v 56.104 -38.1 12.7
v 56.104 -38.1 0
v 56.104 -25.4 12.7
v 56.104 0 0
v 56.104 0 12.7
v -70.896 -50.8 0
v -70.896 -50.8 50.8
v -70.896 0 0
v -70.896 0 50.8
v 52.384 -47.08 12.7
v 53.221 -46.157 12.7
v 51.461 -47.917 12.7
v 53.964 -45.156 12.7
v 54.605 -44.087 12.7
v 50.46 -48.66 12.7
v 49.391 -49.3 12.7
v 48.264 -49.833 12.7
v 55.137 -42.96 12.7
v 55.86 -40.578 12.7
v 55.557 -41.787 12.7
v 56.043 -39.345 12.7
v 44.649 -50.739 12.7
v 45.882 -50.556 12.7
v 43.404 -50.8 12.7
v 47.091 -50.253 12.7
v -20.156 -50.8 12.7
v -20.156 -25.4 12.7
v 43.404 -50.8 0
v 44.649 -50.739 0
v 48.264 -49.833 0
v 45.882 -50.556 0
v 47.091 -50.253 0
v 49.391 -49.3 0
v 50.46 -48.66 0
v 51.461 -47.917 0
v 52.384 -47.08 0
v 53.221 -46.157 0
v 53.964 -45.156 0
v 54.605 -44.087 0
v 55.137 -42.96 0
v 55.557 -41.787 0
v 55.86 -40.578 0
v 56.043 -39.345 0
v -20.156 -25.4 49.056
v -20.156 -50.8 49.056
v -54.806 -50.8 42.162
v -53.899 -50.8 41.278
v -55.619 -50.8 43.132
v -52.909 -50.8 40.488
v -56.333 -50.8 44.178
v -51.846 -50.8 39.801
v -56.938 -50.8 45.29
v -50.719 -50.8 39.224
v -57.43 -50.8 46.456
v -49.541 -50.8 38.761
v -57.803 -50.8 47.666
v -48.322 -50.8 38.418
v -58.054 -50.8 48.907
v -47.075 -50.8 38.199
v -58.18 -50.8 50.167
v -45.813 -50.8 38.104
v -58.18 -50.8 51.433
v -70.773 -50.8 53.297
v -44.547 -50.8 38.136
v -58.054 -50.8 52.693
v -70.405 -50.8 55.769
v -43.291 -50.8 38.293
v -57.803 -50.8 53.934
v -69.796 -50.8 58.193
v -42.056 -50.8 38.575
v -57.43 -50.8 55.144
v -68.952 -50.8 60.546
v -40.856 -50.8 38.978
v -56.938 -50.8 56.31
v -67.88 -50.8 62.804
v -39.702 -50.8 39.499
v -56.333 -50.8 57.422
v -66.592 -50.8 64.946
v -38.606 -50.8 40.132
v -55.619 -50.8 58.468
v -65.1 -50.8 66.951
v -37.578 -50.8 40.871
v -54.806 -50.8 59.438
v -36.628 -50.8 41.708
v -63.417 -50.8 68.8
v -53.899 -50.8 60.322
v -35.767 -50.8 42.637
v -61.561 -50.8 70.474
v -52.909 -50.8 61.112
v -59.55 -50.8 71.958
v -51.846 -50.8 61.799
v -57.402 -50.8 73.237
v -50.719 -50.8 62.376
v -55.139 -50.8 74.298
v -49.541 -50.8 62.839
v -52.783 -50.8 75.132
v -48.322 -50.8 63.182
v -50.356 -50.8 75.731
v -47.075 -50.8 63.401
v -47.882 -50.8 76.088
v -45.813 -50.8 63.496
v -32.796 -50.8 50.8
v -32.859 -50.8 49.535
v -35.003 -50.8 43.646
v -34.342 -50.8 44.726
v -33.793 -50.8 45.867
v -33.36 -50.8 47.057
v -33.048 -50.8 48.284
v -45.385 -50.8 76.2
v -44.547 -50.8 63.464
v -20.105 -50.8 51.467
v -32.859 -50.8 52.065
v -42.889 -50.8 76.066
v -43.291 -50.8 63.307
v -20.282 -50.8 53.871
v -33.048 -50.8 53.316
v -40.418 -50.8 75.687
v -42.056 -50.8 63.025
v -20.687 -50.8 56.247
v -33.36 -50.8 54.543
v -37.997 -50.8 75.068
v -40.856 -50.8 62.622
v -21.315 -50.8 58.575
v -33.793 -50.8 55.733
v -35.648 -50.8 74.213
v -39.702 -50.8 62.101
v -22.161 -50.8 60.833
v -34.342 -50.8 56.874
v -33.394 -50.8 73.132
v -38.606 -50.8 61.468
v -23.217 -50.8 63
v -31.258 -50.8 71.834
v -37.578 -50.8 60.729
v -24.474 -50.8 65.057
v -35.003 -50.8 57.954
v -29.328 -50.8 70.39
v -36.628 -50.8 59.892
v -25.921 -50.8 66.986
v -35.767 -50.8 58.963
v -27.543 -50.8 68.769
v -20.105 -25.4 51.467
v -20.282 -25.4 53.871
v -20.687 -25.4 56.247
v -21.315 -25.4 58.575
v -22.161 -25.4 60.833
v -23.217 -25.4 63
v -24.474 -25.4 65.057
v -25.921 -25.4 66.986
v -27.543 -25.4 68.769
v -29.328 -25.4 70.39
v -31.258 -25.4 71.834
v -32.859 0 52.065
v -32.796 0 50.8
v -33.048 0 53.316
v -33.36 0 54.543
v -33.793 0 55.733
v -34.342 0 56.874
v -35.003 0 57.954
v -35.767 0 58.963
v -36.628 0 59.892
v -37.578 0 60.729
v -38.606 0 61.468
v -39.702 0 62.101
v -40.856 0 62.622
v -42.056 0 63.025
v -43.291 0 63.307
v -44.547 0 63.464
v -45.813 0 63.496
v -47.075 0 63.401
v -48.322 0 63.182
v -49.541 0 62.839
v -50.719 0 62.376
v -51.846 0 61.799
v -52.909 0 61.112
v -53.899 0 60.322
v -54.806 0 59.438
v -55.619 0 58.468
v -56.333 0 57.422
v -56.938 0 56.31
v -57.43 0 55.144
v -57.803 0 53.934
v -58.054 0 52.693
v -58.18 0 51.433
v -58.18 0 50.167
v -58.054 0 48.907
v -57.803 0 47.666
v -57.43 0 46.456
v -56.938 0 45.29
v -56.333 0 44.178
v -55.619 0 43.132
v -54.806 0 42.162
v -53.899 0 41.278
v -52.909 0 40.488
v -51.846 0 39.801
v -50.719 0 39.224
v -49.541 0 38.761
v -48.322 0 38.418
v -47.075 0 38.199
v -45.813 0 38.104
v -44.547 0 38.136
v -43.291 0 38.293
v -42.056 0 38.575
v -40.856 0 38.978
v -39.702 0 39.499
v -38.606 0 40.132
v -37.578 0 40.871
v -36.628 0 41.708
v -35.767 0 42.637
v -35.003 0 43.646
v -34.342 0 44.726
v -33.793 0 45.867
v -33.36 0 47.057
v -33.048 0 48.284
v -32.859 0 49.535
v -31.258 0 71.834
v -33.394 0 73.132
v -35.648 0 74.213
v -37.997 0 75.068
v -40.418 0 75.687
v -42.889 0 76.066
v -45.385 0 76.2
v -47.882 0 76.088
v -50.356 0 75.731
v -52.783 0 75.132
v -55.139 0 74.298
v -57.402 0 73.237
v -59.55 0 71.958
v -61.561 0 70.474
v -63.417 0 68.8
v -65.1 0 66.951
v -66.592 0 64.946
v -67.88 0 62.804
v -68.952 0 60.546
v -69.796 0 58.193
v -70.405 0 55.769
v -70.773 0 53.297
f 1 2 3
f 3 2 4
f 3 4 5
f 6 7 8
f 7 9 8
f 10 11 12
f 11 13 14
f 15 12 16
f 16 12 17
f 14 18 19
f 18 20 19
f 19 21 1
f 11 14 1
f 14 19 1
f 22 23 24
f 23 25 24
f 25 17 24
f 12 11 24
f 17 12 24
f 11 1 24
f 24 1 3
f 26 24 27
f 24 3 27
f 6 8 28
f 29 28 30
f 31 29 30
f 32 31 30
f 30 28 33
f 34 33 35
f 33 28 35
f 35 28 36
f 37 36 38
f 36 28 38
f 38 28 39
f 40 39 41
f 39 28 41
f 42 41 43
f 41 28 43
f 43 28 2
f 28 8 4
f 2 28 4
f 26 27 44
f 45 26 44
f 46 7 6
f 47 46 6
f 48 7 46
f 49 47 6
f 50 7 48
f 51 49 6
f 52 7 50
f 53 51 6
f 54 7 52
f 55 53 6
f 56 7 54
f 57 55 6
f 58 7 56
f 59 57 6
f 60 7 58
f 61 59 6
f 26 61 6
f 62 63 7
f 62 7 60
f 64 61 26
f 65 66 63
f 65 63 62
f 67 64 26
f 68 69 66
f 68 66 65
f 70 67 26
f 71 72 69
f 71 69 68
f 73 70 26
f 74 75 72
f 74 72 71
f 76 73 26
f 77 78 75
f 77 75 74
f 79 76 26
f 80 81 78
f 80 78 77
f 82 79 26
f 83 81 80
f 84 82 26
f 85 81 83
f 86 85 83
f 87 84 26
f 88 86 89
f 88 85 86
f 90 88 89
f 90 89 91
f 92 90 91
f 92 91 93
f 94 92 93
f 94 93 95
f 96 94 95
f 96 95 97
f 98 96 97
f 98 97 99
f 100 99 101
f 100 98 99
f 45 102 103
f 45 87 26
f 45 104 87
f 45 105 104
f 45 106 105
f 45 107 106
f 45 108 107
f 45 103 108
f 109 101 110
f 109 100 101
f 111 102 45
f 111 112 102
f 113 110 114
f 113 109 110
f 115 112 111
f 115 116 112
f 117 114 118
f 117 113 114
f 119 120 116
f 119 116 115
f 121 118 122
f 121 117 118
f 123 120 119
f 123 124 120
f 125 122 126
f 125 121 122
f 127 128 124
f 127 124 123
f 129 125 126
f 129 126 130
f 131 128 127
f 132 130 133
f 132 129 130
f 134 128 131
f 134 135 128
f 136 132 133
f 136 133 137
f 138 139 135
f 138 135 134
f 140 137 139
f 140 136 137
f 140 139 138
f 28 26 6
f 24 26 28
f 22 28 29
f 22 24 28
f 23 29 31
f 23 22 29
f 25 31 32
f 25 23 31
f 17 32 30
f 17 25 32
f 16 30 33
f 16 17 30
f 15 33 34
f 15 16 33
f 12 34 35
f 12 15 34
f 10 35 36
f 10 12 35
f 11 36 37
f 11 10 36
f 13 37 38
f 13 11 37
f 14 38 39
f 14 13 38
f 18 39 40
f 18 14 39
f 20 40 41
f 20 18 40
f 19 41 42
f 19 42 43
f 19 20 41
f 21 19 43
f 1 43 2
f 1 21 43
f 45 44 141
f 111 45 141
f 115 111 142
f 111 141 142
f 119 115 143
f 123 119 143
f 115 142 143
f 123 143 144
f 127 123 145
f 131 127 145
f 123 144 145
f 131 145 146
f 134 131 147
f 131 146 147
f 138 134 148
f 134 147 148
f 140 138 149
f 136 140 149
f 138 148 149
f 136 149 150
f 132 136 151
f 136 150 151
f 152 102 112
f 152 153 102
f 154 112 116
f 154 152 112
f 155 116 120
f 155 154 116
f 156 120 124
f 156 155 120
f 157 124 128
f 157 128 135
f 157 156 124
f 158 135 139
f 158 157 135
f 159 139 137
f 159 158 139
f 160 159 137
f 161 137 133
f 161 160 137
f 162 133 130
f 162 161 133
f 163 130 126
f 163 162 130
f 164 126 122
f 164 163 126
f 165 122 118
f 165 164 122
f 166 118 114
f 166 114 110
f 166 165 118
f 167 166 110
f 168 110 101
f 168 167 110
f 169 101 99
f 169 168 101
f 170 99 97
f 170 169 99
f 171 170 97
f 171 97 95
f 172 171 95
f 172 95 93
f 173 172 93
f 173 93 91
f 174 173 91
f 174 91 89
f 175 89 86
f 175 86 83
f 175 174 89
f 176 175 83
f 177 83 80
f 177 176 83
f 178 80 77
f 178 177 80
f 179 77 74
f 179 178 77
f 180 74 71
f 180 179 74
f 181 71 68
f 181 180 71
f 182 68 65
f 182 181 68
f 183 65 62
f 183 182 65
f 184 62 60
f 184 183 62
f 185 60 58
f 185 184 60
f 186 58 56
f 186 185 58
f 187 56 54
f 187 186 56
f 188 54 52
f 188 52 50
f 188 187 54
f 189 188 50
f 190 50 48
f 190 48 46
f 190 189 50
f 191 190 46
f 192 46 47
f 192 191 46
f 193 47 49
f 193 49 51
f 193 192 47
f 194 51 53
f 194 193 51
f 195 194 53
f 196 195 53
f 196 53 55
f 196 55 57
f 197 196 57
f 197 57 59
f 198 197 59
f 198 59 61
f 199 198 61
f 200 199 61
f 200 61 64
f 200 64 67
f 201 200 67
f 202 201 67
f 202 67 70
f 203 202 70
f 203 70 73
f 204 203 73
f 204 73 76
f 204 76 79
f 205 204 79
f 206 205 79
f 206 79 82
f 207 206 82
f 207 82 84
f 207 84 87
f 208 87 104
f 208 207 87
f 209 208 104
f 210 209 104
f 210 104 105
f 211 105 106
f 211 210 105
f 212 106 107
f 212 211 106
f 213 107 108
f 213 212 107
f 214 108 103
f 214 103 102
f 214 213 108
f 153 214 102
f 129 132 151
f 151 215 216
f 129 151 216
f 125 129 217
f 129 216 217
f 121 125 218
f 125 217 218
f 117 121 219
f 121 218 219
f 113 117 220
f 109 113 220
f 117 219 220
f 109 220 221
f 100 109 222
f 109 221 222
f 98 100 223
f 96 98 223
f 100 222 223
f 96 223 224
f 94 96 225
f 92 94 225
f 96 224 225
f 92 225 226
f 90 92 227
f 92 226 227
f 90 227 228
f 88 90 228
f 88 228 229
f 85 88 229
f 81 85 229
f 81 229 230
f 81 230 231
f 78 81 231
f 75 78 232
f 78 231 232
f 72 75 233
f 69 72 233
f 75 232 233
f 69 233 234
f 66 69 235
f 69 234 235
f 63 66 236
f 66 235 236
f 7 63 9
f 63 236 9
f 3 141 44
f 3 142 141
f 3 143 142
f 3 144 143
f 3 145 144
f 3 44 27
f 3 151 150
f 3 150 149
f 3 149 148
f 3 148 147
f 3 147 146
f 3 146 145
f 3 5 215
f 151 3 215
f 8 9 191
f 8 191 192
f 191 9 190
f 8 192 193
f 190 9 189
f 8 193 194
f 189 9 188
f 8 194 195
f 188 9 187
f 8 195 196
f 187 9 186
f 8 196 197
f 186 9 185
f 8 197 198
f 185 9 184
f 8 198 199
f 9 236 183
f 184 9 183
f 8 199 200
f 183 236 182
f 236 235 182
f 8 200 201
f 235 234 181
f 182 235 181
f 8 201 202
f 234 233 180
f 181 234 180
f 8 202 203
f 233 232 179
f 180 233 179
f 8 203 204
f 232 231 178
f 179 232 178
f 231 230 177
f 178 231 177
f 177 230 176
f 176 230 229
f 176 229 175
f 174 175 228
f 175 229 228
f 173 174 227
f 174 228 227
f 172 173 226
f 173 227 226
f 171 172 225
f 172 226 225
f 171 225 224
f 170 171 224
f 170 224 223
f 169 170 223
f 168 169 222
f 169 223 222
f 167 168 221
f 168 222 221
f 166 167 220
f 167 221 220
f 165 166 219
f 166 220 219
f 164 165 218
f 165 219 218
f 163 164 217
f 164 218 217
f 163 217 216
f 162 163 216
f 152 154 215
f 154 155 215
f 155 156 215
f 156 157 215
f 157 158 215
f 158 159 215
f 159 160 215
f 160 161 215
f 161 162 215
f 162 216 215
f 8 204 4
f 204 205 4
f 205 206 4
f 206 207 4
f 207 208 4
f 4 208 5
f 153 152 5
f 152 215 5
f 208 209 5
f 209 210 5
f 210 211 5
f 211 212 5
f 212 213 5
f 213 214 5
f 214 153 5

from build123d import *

# Parameters (mm, degrees)
F0_R     = 12.7
F1_DEPTH = 25.4
F2_R     = 12.7
F3_DEPTH = 25.4
F4_R     = 12.7


with BuildPart() as f1:
    # F0 (on Front) → F1 (new body)
    with BuildSketch(Plane.XZ):
        with BuildLine():
            Line((56.1041173697, 12.7), (-31.2580095022, 71.8343283417))
            ThreePointArc((-31.2580095022, 71.8343283417), (-57.402141962, 73.2365993129), (-70.8958826303, 50.8))
            Line((-70.8958826303, 50.8), (-70.8958826303, 0))
            Line((-70.8958826303, 0), (56.1041173697, 0))
            Line((56.1041173697, 0), (56.1041173697, 12.7))
        make_face()
        with Locations((-45.4958826303, 50.8)):
            Circle(F0_R, mode=Mode.SUBTRACT)
    extrude(amount=F1_DEPTH)

    # F2 (on face) → F3 (join)
    with BuildSketch(Plane.XZ.offset(25.4)):
        with BuildLine():
            Line((-20.1558080966, 12.7), (-20.1558080966, 49.0562618815))
            ThreePointArc((-20.1558080966, 49.0562618815), (-22.663590516, 61.9286313985), (-31.2580095022, 71.8343283417))
            ThreePointArc((-31.2580095022, 71.8343283417), (-57.402141962, 73.2365993129), (-70.8958826303, 50.8))
            Line((-70.8958826303, 50.8), (-70.8958826303, 12.7))
            Line((-70.8958826303, 12.7), (-70.8958826303, 7.7714477666))
            Line((-70.8958826303, 7.7714477666), (-70.8958826303, 0))
            Line((-70.8958826303, 0), (56.1041173697, 0))
            Line((56.1041173697, 0), (56.1041173697, 7.7714477666))
            Line((56.1041173697, 7.7714477666), (56.1041173697, 12.7))
            Line((56.1041173697, 12.7), (-20.1558080966, 12.7))
        make_face()
        with Locations((-45.4958826303, 50.8)):
            Circle(F2_R, mode=Mode.SUBTRACT)
    extrude(amount=F3_DEPTH)

    # F4
    f4_edges = [f1.edges().sort_by_distance(p)[0] for p in [
        (56.104117, -50.8, 6.35),
    ]]
    fillet(f4_edges, radius=F4_R)


solid = f1.part
